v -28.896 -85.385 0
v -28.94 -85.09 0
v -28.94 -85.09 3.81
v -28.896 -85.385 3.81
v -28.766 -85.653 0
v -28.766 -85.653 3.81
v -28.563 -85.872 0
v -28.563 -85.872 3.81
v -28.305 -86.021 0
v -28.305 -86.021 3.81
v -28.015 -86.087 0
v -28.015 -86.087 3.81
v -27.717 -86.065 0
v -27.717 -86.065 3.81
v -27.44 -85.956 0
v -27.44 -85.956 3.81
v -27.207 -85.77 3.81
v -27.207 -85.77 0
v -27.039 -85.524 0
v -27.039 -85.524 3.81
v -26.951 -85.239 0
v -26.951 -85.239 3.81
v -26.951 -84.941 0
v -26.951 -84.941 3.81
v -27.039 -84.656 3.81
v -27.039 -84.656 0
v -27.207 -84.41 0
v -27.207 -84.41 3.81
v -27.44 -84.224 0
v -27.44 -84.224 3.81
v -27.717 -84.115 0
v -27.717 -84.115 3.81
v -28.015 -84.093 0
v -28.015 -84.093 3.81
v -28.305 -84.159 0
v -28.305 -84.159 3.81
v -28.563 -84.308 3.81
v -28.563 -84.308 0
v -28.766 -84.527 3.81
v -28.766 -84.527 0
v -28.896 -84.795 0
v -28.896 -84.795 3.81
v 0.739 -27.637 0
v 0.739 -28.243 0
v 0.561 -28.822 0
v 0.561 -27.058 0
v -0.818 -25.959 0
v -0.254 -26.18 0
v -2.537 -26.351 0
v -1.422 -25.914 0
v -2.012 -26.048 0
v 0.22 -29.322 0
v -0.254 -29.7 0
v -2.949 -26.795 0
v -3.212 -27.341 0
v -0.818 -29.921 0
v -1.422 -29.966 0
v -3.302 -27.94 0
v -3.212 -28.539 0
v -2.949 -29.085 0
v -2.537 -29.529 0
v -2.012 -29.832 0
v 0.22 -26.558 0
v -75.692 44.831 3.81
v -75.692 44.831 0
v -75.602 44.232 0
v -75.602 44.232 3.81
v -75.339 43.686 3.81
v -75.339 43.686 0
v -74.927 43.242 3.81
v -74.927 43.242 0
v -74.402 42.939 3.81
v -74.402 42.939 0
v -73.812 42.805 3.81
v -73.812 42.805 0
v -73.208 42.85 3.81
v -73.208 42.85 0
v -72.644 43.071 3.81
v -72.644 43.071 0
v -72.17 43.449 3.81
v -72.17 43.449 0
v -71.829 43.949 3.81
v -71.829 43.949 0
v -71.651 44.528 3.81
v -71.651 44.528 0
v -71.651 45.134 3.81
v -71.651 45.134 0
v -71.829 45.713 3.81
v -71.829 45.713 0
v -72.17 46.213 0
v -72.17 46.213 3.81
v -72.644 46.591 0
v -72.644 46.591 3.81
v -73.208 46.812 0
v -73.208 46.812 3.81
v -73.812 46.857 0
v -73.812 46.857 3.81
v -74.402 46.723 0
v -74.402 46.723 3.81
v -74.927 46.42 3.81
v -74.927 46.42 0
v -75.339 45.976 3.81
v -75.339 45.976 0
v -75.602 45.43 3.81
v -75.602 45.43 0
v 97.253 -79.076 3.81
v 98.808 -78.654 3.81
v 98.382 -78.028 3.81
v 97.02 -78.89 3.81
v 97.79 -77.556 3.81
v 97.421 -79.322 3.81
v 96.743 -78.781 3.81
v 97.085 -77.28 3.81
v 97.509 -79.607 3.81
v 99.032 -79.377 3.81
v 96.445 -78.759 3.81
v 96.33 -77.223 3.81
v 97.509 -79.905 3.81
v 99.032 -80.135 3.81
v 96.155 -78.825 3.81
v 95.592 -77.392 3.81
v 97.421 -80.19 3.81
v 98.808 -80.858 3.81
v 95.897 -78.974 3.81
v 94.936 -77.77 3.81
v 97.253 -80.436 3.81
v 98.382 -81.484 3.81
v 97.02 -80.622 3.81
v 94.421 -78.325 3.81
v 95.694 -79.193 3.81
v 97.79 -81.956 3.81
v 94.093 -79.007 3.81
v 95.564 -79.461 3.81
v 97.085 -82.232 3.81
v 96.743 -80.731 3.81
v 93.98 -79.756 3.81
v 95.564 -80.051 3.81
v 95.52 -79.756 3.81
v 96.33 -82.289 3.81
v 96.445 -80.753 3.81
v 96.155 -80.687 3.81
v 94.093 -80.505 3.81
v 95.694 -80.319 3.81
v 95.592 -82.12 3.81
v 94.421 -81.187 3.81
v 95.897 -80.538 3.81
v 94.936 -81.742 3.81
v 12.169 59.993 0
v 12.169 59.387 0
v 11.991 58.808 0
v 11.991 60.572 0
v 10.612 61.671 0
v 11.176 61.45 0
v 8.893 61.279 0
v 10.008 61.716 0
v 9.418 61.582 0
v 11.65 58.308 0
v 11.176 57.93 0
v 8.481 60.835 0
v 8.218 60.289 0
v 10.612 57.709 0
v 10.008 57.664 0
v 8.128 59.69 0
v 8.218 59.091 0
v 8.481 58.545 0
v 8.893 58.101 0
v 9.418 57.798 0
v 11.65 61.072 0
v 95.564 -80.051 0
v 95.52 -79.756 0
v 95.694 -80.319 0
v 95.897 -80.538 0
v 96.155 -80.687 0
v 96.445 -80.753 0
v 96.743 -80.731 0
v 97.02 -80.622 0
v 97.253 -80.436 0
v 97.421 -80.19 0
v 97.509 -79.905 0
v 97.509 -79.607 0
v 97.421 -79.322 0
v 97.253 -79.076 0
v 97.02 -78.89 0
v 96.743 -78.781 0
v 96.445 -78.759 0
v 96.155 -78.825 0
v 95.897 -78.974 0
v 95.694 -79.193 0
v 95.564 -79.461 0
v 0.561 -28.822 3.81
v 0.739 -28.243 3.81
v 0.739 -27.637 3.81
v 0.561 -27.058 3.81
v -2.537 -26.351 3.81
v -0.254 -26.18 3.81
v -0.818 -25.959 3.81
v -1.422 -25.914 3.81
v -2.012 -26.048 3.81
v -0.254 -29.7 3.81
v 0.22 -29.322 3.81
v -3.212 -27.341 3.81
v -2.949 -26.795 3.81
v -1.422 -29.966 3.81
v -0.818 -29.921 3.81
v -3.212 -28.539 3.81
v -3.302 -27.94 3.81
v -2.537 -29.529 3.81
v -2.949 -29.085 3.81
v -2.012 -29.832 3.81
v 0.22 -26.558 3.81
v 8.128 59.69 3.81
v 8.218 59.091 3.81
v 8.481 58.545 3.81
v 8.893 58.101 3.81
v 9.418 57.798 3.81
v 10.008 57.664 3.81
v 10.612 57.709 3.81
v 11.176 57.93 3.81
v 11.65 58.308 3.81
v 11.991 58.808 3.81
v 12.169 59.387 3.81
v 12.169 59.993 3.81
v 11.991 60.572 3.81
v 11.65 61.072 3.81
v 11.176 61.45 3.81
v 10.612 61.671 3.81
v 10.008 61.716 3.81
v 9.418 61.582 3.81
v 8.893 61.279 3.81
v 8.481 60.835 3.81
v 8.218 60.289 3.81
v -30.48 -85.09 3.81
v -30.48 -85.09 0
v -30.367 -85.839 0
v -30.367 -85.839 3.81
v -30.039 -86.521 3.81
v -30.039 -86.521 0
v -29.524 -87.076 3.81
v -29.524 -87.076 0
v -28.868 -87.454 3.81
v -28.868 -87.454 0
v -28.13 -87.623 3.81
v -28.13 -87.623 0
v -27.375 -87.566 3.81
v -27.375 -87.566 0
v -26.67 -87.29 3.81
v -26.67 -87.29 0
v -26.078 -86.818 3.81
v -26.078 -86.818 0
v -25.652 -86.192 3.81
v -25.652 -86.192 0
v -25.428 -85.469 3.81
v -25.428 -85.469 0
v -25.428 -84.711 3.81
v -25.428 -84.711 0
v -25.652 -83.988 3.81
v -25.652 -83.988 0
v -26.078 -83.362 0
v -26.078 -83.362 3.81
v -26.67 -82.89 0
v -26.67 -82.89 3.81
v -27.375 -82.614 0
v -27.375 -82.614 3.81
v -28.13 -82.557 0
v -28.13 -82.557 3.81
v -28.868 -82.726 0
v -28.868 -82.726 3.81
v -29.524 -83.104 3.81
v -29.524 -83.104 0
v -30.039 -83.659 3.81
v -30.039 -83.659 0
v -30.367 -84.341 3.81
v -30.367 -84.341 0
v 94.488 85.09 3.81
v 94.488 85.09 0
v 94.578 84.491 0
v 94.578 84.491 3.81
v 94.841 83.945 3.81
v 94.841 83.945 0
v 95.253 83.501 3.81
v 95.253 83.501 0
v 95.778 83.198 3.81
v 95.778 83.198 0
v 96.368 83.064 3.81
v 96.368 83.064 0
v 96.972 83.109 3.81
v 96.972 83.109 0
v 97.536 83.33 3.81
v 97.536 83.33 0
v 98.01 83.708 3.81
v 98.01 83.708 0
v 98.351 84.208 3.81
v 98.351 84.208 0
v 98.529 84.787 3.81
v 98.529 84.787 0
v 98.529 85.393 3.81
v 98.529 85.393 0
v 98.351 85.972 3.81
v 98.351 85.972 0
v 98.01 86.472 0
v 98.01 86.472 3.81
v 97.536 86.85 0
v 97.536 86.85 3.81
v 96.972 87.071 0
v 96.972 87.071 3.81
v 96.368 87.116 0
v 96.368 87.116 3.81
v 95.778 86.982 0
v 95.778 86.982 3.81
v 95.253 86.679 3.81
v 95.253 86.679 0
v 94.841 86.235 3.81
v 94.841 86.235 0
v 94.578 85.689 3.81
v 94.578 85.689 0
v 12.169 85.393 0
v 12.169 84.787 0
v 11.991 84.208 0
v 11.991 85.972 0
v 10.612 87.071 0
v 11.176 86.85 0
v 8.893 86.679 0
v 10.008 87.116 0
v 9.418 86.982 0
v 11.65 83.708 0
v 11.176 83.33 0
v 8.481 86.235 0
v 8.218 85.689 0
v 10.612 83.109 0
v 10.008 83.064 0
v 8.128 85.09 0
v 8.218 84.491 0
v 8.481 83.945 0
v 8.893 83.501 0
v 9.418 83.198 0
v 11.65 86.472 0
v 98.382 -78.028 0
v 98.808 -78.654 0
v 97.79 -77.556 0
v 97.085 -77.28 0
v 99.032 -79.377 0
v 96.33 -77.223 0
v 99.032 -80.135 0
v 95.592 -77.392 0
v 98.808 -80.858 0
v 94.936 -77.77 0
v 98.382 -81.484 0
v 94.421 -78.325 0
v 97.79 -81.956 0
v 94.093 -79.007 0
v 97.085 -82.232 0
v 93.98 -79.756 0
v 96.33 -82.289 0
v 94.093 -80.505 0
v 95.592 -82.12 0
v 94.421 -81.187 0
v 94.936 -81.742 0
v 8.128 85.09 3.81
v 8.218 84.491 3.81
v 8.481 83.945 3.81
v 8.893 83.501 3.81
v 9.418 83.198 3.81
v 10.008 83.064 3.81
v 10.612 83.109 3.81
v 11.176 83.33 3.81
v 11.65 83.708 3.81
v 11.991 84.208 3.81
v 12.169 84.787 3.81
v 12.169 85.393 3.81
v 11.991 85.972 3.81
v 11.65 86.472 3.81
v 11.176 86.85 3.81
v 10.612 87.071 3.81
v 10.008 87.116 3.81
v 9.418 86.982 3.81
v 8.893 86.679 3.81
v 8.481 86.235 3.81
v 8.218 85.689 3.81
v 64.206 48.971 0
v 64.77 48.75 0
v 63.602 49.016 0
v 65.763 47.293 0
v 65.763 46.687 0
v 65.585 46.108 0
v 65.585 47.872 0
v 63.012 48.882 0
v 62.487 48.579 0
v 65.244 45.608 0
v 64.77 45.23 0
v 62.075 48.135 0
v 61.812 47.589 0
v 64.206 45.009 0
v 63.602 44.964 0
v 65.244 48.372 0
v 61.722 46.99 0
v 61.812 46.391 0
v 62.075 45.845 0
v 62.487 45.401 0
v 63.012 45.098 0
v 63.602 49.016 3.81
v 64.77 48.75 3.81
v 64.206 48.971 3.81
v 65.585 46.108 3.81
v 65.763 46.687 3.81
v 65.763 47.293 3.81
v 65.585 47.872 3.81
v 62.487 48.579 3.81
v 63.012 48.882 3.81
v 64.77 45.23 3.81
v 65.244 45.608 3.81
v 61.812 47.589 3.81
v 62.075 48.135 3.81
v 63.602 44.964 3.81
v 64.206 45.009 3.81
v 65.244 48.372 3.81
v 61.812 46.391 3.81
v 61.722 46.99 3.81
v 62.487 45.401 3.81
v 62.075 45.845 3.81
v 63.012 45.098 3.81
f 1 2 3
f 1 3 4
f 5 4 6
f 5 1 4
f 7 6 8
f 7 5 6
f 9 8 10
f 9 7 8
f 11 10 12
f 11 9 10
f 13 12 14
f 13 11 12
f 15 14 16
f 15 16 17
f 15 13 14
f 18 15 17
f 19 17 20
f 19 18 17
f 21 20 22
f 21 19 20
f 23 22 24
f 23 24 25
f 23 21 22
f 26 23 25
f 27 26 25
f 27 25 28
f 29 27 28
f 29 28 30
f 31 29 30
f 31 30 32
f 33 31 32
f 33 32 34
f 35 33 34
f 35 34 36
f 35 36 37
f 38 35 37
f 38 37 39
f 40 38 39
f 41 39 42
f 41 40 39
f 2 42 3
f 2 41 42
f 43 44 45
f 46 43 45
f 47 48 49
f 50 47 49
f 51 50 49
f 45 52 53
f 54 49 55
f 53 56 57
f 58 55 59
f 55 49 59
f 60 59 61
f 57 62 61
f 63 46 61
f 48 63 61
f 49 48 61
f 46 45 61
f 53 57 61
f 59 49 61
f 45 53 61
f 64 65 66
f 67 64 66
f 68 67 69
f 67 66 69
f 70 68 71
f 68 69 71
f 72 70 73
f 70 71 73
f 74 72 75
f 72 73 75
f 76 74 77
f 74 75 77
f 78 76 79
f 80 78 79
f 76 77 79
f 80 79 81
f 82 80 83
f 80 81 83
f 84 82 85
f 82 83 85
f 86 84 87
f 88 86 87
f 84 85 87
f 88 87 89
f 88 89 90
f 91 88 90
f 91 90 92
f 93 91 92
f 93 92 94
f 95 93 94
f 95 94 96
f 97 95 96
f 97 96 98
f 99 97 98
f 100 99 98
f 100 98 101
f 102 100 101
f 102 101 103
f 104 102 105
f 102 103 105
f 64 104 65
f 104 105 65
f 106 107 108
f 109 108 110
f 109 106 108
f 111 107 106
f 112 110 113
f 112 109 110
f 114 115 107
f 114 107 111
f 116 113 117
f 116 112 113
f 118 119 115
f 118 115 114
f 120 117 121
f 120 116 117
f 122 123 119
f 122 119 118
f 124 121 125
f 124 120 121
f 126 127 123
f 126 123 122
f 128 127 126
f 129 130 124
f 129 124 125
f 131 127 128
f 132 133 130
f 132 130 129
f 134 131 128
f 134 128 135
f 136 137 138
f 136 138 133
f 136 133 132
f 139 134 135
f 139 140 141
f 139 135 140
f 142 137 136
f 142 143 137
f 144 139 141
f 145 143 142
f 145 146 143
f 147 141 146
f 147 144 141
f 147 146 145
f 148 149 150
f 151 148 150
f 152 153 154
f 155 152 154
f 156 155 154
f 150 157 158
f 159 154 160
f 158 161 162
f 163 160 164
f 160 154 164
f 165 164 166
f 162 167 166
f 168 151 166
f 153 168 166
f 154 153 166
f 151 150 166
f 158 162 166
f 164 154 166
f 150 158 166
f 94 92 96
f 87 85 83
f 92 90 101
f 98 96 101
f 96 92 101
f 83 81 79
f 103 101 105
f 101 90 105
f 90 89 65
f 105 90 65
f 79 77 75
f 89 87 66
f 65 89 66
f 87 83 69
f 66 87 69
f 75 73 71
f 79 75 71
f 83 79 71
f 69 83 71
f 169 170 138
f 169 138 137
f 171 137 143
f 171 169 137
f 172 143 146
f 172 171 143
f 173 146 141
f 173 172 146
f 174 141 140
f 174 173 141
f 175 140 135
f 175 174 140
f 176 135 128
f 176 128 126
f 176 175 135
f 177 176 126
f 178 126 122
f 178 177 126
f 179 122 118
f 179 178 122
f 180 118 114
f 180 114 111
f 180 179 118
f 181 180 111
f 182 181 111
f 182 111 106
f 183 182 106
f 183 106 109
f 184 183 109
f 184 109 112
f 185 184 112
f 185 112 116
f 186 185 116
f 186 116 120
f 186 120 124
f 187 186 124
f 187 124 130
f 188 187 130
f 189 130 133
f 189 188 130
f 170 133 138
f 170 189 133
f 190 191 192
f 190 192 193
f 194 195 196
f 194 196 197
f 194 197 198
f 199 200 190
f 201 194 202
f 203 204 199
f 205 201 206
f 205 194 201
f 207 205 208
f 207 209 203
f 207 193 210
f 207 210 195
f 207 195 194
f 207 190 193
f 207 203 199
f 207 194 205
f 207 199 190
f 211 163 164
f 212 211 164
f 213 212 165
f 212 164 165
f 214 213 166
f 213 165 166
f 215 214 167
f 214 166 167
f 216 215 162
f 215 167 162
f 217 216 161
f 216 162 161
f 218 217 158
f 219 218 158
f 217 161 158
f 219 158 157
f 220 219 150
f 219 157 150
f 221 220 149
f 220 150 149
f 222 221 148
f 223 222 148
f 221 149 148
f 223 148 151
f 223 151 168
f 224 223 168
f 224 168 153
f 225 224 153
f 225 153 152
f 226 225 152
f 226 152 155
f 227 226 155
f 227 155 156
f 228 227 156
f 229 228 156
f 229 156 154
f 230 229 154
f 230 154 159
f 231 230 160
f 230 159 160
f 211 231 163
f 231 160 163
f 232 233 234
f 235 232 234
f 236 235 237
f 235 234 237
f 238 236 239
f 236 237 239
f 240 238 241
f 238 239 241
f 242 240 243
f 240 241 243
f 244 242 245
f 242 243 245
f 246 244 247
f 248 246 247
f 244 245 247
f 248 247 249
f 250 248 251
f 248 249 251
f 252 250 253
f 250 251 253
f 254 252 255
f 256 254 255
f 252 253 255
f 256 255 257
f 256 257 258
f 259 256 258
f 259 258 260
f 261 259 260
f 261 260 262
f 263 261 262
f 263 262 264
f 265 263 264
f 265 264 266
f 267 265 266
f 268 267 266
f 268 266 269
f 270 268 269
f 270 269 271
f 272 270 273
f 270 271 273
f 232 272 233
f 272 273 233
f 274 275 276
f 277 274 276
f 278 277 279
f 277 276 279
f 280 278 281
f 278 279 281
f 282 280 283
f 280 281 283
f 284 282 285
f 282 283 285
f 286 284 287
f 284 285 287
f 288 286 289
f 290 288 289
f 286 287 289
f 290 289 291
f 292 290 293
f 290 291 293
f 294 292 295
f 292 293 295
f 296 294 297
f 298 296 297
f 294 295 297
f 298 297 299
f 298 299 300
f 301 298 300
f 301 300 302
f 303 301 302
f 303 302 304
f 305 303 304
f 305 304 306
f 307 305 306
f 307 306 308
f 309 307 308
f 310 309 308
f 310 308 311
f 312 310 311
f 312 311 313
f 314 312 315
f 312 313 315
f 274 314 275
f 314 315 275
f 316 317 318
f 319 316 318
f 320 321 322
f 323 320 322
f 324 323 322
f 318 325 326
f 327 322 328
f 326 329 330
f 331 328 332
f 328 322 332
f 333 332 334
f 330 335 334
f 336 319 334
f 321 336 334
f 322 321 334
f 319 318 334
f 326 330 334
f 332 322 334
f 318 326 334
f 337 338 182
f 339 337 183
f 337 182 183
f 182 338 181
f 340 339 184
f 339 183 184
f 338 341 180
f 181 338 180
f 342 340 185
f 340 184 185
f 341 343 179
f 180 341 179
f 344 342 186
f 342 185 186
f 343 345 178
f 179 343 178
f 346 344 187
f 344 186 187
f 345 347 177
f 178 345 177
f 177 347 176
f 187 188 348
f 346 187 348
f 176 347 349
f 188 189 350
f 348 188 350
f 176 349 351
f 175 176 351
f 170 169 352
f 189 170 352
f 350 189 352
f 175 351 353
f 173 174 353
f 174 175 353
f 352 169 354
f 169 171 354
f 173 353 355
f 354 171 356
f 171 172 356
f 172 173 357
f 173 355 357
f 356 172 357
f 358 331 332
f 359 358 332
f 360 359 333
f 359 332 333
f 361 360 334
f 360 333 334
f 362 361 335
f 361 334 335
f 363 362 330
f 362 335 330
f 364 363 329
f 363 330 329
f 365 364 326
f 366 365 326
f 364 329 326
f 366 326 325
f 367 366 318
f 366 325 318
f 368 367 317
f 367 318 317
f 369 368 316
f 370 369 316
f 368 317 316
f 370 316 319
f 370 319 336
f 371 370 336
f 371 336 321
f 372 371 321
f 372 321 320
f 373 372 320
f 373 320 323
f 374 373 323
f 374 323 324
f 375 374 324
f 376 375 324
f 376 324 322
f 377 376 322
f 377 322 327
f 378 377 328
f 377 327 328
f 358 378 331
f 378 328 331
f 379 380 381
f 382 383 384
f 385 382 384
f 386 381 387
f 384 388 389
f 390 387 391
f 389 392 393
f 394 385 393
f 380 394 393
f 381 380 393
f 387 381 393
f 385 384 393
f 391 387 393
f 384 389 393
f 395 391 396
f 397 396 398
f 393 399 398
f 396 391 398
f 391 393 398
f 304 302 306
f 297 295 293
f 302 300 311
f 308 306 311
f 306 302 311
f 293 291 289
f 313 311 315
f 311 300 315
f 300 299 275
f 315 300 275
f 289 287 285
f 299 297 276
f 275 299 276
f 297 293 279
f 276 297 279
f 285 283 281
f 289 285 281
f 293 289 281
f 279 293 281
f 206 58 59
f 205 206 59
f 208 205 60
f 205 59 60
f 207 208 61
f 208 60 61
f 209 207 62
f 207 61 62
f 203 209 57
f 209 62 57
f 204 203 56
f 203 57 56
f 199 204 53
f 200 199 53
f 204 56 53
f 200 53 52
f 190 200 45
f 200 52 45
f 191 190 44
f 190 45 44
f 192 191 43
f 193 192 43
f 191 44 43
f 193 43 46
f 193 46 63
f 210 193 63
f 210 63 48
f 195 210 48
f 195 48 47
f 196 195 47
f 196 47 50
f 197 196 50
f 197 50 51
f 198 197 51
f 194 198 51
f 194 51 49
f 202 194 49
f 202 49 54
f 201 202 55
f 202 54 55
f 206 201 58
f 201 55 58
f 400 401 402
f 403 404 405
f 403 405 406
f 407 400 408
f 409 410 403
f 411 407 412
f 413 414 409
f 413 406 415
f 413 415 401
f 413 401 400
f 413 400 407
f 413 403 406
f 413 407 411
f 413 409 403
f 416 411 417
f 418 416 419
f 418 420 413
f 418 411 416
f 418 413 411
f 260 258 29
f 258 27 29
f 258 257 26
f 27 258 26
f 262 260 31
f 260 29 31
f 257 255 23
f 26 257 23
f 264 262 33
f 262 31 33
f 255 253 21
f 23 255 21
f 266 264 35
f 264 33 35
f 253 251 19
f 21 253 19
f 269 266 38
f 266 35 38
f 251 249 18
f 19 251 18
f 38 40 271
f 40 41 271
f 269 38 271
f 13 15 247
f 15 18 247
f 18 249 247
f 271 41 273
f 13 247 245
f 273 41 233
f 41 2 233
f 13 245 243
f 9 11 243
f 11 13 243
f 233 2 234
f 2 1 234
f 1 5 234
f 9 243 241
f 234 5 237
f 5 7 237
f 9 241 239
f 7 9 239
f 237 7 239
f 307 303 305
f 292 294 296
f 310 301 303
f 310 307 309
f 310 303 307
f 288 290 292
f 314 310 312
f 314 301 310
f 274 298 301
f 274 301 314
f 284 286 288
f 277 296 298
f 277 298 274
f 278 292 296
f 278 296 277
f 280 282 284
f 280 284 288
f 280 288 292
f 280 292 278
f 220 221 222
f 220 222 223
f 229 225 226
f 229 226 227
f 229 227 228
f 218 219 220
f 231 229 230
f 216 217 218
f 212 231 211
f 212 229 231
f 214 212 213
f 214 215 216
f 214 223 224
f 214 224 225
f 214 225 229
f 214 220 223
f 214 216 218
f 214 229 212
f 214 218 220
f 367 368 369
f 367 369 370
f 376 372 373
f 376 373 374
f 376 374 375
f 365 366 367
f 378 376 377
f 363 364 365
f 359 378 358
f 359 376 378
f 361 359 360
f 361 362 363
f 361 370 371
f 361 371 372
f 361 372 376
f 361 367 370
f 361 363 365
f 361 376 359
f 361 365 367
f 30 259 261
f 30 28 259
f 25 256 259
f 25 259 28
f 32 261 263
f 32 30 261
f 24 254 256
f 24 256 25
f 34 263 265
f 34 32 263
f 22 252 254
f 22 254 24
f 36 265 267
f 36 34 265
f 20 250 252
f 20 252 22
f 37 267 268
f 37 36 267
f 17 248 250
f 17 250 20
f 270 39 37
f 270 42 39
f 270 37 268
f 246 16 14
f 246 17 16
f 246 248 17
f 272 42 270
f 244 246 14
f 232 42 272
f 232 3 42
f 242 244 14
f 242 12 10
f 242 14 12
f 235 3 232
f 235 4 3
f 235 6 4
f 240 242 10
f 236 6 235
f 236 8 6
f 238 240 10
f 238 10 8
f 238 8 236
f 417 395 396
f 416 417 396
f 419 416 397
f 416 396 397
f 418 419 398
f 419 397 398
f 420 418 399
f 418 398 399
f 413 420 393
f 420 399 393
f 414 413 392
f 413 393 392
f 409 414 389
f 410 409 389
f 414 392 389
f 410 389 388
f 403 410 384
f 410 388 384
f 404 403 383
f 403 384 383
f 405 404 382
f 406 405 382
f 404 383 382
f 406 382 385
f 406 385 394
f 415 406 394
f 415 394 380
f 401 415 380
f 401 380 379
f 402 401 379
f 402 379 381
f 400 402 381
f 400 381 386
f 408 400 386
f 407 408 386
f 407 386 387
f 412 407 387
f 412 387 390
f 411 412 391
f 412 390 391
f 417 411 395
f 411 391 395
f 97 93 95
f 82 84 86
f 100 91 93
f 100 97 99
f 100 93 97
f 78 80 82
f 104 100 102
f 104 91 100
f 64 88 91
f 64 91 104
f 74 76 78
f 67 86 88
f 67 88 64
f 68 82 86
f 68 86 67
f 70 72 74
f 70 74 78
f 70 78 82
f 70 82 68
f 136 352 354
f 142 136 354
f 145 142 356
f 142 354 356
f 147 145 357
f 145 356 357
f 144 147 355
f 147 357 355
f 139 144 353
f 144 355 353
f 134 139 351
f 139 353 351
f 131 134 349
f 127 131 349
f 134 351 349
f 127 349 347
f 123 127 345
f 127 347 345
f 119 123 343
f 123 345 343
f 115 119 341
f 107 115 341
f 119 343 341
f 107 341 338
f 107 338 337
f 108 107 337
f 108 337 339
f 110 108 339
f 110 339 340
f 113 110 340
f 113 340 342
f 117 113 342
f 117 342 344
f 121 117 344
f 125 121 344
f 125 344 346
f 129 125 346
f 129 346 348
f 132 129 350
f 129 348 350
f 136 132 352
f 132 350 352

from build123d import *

# Parameters (mm, degrees)
SKETCH1_R             = 2.54
SKETCH1_R_2           = 1
BOSS_EXTRUDE1_DEPTH   = 3.81
BOSS_EXTRUDE1_2_DEPTH = 3.81
SKETCH1_R_3           = 2.032
BOSS_EXTRUDE1_3_DEPTH = 3.81
BOSS_EXTRUDE1_4_DEPTH = 3.81
BOSS_EXTRUDE1_5_DEPTH = 3.81
BOSS_EXTRUDE1_6_DEPTH = 3.81
BOSS_EXTRUDE1_7_DEPTH = 3.81
BOSS_EXTRUDE1_8_DEPTH = 3.81


with BuildPart() as part:
    # Sketch1 → Boss-Extrude1 (new body)
    with BuildSketch(Plane.XY):
        with Locations(Location((96.52, -79.756, 0), (0, 0, 180))):
            Circle(SKETCH1_R)
        with Locations(Location((96.52, -79.756, 0), (0, 0, 180))):
            Circle(SKETCH1_R_2, mode=Mode.SUBTRACT)
    extrude(amount=BOSS_EXTRUDE1_DEPTH)


with BuildPart() as body_2:
    # Sketch1 → Boss-Extrude1 2 (new body)
    with BuildSketch(Plane.XY):
        with Locations(Location((-27.94, -85.09, 0), (0, 0, 180))):
            Circle(SKETCH1_R)
        with Locations(Location((-27.94, -85.09, 0), (0, 0, 180))):
            Circle(SKETCH1_R_2, mode=Mode.SUBTRACT)
    extrude(amount=BOSS_EXTRUDE1_2_DEPTH)


with BuildPart() as body_3:
    # Sketch1 → Boss-Extrude1 3 (new body)
    with BuildSketch(Plane.XY):
        with Locations(Location((-1.27, -27.94, 0), (0, 0, 180))):
            Circle(SKETCH1_R_3)
    extrude(amount=BOSS_EXTRUDE1_3_DEPTH)


with BuildPart() as body_4:
    # Sketch1 → Boss-Extrude1 4 (new body)
    with BuildSketch(Plane.XY):
        with Locations(Location((63.754, 46.99, 0), (0, 0, 180))):
            Circle(SKETCH1_R_3)
    extrude(amount=BOSS_EXTRUDE1_4_DEPTH)


with BuildPart() as body_5:
    # Sketch1 → Boss-Extrude1 5 (new body)
    with BuildSketch(Plane.XY):
        with Locations(Location((10.16, 59.69, 0), (0, 0, 180))):
            Circle(SKETCH1_R_3)
    extrude(amount=BOSS_EXTRUDE1_5_DEPTH)


with BuildPart() as body_6:
    # Sketch1 → Boss-Extrude1 6 (new body)
    with BuildSketch(Plane.XY):
        with Locations(Location((10.16, 85.09, 0), (0, 0, 180))):
            Circle(SKETCH1_R_3)
    extrude(amount=BOSS_EXTRUDE1_6_DEPTH)


with BuildPart() as body_7:
    # Sketch1 → Boss-Extrude1 7 (new body)
    with BuildSketch(Plane.XY):
        with Locations(Location((96.52, 85.09, 0), (0, 0, 180))):
            Circle(SKETCH1_R_3)
    extrude(amount=BOSS_EXTRUDE1_7_DEPTH)


with BuildPart() as body_8:
    # Sketch1 → Boss-Extrude1 8 (new body)
    with BuildSketch(Plane.XY):
        with Locations(Location((-73.66, 44.831, 0), (0, 0, 180))):
            Circle(SKETCH1_R_3)
    extrude(amount=BOSS_EXTRUDE1_8_DEPTH)


solid = Compound([part.part, body_2.part, body_3.part, body_4.part, body_5.part, body_6.part, body_7.part, body_8.part])
